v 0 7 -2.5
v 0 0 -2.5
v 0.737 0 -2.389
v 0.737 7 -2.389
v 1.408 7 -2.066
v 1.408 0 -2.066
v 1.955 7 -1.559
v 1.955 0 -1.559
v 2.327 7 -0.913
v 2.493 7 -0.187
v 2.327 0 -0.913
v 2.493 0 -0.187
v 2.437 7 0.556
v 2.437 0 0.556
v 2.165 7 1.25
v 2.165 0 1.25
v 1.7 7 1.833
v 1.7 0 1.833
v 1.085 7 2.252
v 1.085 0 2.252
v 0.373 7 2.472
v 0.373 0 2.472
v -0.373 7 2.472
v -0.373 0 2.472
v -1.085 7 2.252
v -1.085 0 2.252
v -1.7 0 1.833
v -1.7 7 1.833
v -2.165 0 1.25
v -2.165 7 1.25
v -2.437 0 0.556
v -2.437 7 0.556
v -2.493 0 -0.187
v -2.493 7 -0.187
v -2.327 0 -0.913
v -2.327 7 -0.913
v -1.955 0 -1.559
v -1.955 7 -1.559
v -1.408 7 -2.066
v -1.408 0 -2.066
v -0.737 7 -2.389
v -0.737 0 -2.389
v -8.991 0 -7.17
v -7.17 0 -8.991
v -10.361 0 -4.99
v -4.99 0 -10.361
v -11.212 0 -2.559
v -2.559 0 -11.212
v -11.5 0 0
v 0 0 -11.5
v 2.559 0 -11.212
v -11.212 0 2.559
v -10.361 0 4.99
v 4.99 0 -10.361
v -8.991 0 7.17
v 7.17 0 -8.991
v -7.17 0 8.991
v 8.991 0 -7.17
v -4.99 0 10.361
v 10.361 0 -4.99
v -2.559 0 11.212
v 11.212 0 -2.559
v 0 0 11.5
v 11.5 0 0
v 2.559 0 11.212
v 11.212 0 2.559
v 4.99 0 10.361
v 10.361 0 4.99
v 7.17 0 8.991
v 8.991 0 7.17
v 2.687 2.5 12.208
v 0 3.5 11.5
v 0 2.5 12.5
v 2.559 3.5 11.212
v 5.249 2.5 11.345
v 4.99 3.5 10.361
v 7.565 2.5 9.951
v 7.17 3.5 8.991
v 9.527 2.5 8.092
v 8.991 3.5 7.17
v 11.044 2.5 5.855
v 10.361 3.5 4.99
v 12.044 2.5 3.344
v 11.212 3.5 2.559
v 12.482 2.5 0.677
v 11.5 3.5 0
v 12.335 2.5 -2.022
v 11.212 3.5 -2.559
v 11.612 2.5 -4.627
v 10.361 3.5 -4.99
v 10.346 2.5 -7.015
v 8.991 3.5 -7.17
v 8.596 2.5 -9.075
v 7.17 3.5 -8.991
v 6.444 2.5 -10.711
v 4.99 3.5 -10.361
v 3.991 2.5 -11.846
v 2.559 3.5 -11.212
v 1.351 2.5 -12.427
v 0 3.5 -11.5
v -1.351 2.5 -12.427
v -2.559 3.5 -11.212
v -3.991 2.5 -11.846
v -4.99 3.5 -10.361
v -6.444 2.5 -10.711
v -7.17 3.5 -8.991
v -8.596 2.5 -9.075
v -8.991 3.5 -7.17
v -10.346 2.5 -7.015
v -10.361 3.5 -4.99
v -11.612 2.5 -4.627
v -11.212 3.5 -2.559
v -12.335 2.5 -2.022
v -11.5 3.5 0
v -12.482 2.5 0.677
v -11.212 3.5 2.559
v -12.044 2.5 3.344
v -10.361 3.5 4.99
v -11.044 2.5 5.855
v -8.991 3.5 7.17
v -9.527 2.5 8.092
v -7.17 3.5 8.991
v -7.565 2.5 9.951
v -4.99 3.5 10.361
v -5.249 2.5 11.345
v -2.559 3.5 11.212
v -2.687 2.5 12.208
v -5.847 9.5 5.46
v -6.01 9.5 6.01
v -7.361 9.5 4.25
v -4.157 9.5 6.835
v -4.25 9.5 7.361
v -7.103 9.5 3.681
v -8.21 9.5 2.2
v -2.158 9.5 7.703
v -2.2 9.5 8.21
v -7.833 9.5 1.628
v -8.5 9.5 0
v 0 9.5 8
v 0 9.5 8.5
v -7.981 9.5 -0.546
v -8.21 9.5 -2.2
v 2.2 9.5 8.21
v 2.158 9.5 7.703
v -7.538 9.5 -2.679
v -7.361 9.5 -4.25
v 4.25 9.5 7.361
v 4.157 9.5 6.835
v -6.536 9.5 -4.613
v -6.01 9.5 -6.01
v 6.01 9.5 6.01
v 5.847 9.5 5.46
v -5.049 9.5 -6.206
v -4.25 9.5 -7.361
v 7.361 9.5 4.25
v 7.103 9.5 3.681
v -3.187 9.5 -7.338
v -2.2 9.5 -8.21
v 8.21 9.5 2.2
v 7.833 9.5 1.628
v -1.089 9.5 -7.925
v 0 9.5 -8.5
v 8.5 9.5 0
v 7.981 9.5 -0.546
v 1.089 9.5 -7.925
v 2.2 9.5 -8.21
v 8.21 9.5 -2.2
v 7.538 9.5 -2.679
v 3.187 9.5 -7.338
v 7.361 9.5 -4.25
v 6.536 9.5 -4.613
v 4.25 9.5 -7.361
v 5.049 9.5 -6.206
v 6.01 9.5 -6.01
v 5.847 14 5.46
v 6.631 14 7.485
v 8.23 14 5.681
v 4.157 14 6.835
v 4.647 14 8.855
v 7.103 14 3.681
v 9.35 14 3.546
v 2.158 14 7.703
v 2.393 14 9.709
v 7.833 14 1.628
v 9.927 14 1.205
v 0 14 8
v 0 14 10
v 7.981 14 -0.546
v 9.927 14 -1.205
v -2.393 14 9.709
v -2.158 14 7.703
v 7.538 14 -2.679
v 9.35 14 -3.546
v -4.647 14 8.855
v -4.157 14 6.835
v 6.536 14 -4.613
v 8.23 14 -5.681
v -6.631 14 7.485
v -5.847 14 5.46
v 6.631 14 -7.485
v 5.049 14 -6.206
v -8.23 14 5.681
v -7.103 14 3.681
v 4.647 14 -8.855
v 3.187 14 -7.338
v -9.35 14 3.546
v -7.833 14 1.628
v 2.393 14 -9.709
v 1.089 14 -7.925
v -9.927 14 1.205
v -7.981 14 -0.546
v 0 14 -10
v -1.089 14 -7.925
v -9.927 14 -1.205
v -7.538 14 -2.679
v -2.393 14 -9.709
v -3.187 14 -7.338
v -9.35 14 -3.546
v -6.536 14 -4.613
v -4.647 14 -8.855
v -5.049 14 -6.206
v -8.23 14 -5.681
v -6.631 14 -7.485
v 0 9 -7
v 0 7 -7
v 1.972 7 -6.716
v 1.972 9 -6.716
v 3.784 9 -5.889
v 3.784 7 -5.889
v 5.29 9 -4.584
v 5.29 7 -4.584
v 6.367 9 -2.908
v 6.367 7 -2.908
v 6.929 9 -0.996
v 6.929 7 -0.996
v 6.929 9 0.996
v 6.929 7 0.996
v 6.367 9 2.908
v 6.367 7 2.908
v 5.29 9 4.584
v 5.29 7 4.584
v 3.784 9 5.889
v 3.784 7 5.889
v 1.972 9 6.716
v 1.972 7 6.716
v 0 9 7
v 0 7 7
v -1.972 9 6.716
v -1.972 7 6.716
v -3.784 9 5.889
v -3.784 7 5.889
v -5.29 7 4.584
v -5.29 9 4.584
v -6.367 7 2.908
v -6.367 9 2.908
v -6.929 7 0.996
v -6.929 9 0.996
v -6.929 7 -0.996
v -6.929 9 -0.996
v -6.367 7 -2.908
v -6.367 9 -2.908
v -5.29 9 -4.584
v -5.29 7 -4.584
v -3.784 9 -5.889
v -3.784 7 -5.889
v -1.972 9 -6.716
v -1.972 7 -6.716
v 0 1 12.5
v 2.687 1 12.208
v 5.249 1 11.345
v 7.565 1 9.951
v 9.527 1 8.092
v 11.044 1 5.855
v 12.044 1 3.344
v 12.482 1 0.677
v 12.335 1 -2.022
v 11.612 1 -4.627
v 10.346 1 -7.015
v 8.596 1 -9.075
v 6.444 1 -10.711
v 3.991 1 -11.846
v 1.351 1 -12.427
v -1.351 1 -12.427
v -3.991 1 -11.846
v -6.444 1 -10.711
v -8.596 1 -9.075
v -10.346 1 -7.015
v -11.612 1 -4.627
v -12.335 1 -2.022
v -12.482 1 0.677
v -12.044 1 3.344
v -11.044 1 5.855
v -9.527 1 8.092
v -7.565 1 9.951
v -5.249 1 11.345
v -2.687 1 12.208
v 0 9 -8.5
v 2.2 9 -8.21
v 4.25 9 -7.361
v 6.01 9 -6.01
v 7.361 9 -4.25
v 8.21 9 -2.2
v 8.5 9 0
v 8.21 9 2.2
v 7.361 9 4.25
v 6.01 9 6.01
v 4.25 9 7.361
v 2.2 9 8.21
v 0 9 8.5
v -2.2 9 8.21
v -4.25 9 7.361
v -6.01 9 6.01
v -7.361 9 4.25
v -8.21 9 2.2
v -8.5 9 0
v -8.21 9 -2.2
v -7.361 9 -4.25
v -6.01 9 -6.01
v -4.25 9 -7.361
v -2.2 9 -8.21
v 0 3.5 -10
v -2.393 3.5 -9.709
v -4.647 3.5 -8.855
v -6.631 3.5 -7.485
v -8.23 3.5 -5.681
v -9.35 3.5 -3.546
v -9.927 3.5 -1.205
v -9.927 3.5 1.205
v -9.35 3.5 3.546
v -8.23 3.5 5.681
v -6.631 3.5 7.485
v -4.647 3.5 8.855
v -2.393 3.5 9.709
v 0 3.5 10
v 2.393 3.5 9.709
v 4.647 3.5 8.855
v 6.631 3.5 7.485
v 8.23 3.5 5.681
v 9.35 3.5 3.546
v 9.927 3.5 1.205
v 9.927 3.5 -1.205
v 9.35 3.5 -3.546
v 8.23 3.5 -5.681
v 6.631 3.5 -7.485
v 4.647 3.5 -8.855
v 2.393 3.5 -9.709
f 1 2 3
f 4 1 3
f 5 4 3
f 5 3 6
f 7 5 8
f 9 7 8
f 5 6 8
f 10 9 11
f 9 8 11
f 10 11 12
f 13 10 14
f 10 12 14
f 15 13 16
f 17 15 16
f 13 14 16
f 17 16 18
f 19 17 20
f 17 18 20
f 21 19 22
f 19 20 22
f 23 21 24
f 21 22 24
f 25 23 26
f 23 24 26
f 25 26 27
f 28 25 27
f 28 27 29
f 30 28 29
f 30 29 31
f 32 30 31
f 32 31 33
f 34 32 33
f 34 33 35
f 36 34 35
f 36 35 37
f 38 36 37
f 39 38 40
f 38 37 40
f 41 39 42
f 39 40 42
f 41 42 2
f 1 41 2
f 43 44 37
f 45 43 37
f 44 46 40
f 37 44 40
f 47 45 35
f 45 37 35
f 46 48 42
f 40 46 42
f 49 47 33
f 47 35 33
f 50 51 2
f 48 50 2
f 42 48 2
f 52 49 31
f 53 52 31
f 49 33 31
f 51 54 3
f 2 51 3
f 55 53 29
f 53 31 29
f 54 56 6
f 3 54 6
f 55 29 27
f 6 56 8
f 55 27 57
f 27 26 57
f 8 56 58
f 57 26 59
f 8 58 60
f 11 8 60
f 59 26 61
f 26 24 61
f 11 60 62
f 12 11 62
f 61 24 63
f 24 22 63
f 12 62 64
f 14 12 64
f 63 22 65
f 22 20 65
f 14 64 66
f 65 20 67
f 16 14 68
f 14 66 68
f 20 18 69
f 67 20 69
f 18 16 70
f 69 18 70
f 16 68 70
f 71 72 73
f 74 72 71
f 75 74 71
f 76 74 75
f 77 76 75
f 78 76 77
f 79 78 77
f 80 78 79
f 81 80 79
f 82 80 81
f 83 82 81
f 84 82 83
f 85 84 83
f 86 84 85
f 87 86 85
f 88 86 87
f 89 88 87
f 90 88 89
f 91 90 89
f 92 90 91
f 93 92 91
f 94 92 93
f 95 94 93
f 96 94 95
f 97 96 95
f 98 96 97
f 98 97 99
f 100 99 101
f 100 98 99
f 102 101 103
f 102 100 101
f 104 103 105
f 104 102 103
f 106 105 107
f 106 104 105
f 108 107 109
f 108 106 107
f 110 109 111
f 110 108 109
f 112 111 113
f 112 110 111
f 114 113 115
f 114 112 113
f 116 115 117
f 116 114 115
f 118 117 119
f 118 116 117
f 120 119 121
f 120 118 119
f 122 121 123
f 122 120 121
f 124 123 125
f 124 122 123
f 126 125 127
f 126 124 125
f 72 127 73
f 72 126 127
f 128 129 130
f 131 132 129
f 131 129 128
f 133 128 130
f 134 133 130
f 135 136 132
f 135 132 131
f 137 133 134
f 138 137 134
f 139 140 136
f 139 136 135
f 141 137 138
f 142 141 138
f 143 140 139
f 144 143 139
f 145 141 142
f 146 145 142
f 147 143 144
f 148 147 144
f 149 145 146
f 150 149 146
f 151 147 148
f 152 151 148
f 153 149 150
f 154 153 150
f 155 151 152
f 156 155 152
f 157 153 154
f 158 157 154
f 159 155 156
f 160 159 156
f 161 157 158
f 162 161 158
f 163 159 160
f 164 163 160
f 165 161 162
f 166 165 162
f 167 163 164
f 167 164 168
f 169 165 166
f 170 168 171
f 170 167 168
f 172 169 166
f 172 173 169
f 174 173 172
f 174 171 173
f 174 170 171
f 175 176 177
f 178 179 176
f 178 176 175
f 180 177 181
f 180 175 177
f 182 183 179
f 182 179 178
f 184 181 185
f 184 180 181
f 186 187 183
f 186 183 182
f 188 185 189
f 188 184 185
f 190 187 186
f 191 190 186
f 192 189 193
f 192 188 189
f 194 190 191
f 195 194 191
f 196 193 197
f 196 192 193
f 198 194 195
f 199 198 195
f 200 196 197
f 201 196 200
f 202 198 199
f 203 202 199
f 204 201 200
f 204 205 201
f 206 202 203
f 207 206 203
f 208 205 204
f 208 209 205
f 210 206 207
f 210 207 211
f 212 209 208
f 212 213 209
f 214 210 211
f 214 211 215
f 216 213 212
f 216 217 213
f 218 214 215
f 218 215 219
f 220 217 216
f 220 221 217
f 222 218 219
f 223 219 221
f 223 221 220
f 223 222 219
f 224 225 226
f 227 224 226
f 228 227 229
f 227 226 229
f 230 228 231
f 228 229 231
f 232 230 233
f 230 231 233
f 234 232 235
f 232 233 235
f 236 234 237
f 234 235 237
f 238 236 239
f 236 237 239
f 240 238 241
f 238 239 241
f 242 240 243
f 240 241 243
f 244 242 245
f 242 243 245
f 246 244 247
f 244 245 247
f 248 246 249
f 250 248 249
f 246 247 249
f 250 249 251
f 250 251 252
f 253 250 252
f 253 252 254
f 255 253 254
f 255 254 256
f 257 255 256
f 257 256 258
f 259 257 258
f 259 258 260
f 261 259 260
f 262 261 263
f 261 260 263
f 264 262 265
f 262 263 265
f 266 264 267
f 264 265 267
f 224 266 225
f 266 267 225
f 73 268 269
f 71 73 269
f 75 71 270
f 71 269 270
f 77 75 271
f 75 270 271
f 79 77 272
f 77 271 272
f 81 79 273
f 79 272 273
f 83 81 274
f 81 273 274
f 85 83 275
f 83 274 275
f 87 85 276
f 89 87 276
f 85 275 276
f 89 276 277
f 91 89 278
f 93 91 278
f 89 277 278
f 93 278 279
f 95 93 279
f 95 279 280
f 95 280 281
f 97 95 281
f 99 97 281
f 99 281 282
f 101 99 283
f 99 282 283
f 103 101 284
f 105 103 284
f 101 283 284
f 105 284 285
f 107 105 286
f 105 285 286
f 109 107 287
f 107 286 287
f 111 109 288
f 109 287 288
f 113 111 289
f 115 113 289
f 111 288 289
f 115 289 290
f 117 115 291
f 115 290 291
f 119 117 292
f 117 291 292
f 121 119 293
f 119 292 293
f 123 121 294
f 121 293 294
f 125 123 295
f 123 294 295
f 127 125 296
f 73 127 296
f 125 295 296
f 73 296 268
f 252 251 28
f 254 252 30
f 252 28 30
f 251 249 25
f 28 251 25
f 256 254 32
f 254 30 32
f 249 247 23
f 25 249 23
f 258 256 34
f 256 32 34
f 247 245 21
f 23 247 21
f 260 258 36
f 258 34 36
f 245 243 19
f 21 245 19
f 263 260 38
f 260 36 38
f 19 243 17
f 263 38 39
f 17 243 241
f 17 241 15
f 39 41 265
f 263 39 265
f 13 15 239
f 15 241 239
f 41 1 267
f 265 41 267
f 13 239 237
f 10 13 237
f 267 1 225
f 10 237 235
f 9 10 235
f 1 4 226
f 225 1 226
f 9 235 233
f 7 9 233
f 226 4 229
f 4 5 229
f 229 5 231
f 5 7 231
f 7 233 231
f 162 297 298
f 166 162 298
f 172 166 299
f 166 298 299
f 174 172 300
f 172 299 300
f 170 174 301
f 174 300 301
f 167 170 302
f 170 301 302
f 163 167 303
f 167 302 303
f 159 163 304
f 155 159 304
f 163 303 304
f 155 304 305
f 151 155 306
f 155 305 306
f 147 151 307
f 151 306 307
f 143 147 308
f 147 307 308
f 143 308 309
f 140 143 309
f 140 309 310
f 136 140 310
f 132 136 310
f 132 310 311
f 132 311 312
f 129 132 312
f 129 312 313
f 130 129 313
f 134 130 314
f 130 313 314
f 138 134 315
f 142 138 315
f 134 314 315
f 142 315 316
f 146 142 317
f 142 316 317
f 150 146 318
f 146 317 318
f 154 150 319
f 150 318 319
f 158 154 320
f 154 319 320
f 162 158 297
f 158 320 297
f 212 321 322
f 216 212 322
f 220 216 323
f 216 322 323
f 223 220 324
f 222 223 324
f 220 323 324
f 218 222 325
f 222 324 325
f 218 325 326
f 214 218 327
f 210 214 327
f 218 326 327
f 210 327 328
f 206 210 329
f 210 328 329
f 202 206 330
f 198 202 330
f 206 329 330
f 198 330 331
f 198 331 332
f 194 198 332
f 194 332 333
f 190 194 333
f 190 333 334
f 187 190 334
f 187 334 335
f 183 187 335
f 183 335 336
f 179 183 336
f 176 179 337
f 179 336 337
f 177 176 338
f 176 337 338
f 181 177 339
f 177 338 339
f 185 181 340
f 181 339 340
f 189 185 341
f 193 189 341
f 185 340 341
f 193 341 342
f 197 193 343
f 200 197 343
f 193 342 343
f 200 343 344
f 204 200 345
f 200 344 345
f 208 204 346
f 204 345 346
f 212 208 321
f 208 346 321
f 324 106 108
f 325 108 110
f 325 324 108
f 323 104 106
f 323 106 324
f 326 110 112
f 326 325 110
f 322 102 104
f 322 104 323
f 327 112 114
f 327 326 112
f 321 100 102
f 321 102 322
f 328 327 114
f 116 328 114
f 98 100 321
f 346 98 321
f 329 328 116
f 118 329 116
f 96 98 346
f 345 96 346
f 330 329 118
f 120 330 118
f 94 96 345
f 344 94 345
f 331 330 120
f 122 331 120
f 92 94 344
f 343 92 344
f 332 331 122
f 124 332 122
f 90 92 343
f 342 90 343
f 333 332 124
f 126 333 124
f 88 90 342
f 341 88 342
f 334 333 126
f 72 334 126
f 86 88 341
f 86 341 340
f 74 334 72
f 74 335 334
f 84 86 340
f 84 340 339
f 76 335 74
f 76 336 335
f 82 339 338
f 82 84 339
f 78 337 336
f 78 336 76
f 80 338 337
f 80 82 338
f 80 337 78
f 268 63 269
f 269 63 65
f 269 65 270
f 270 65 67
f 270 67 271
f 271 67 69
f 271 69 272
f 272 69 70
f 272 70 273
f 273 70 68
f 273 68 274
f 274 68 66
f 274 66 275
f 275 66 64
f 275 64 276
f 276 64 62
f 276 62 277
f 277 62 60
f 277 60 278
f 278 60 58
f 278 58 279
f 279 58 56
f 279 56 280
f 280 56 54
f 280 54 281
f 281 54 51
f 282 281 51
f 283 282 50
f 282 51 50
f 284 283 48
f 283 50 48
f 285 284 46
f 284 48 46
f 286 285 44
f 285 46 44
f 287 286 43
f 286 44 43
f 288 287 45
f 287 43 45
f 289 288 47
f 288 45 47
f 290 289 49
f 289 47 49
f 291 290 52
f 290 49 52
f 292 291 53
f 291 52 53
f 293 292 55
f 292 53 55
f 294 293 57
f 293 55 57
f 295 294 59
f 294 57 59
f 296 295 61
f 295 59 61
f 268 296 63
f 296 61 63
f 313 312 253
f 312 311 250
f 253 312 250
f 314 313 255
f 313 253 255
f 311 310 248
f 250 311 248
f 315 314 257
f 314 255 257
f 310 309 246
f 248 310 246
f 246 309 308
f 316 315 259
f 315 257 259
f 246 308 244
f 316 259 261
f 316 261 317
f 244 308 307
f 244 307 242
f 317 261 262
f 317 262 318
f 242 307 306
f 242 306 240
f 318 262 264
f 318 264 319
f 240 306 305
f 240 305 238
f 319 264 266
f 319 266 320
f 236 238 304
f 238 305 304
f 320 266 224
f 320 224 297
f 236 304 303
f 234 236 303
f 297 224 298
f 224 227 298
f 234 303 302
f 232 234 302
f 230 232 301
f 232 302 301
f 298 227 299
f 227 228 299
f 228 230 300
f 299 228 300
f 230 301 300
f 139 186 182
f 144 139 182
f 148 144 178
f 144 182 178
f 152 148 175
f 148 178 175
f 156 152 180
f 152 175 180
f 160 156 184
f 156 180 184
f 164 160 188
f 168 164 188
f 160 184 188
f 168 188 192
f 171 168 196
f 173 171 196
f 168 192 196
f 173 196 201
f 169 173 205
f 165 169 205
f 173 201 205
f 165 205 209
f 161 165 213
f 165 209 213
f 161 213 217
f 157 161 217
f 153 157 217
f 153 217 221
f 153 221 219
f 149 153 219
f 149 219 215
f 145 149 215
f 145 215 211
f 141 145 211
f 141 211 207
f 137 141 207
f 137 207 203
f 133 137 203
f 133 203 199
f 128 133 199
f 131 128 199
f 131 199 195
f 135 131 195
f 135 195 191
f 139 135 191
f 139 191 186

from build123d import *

# Parameters (mm, degrees)
ESQUISSE1_R             = 12.5
BOSS_EXTRU_1_DEPTH      = 3.5
ESQUISSE2_R             = 10
BOSS_EXTRU_2_DEPTH      = 10.5
ESQUISSE3_R             = 2.5
ENL_V_MAT_EXTRU_1_DEPTH = 7
ESQUISSE4_R             = 7
ENL_V_MAT_EXTRU_2_DEPTH = 2
ESQUISSE5_R             = 8.5
ENL_V_MAT_EXTRU_3_DEPTH = 0.5
ESQUISSE6_R             = 8
ENL_V_MAT_EXTRU_4_DEPTH = 5
CHANFREIN1_SIZE         = 1
CHANFREIN2_SIZE         = 1


with BuildPart() as part:
    # Esquisse1 → Boss.-Extru.1 (new body)
    with BuildSketch(Plane(origin=(0, 0, 0), x_dir=(1, 0, 0), z_dir=(0, 1, 0))):
        with Locations(Location((0, 0, 0), (0, 0, 270))):
            Circle(ESQUISSE1_R)
    extrude(amount=BOSS_EXTRU_1_DEPTH)

    # Esquisse2 → Boss.-Extru.2 (add)
    with BuildSketch(Plane(origin=(0, 3.5, 0), x_dir=(1, 0, 0), z_dir=(0, 1, 0))):
        with Locations(Location((0, 0, 0), (0, 0, 90))):
            Circle(ESQUISSE2_R)
    extrude(amount=BOSS_EXTRU_2_DEPTH)

    # Esquisse3 → Enlèv. mat.-Extru.1 (cut)
    with BuildSketch(Plane.XZ):
        with Locations(Location((0, 0, 0), (0, 0, 270))):
            Circle(ESQUISSE3_R)
    extrude(amount=-ENL_V_MAT_EXTRU_1_DEPTH, mode=Mode.SUBTRACT)

    # Esquisse4 → Enlèv. mat.-Extru.2 (cut)
    with BuildSketch(Plane.XZ.offset(-7)):
        with Locations(Location((0, 0, 0), (0, 0, 270))):
            Circle(ESQUISSE4_R)
    extrude(amount=-ENL_V_MAT_EXTRU_2_DEPTH, mode=Mode.SUBTRACT)

    # Esquisse5 → Enlèv. mat.-Extru.3 (cut)
    with BuildSketch(Plane.XZ.offset(-9)):
        with Locations(Location((0, 0, 0), (0, 0, 270))):
            Circle(ESQUISSE5_R)
    extrude(amount=-ENL_V_MAT_EXTRU_3_DEPTH, mode=Mode.SUBTRACT)

    # Esquisse6 → Enlèv. mat.-Extru.4 (cut)
    with BuildSketch(Plane(origin=(0, 14, 0), x_dir=(1, 0, 0), z_dir=(0, 1, 0))):
        with Locations(Location((0, 0, 0), (0, 0, 270))):
            Circle(ESQUISSE6_R)
    extrude(amount=-ENL_V_MAT_EXTRU_4_DEPTH, mode=Mode.SUBTRACT)

    # Chanfrein1
    chanfrein1_edges = [part.edges().sort_by_distance(p)[0] for p in [
        (0, 3.5, -12.5),
    ]]
    chamfer(chanfrein1_edges, length=CHANFREIN1_SIZE)

    # Chanfrein2
    chanfrein2_edges = [part.edges().sort_by_distance(p)[0] for p in [
        (0, 0, -12.5),
    ]]
    chamfer(chanfrein2_edges, length=CHANFREIN2_SIZE)


solid = part.part
